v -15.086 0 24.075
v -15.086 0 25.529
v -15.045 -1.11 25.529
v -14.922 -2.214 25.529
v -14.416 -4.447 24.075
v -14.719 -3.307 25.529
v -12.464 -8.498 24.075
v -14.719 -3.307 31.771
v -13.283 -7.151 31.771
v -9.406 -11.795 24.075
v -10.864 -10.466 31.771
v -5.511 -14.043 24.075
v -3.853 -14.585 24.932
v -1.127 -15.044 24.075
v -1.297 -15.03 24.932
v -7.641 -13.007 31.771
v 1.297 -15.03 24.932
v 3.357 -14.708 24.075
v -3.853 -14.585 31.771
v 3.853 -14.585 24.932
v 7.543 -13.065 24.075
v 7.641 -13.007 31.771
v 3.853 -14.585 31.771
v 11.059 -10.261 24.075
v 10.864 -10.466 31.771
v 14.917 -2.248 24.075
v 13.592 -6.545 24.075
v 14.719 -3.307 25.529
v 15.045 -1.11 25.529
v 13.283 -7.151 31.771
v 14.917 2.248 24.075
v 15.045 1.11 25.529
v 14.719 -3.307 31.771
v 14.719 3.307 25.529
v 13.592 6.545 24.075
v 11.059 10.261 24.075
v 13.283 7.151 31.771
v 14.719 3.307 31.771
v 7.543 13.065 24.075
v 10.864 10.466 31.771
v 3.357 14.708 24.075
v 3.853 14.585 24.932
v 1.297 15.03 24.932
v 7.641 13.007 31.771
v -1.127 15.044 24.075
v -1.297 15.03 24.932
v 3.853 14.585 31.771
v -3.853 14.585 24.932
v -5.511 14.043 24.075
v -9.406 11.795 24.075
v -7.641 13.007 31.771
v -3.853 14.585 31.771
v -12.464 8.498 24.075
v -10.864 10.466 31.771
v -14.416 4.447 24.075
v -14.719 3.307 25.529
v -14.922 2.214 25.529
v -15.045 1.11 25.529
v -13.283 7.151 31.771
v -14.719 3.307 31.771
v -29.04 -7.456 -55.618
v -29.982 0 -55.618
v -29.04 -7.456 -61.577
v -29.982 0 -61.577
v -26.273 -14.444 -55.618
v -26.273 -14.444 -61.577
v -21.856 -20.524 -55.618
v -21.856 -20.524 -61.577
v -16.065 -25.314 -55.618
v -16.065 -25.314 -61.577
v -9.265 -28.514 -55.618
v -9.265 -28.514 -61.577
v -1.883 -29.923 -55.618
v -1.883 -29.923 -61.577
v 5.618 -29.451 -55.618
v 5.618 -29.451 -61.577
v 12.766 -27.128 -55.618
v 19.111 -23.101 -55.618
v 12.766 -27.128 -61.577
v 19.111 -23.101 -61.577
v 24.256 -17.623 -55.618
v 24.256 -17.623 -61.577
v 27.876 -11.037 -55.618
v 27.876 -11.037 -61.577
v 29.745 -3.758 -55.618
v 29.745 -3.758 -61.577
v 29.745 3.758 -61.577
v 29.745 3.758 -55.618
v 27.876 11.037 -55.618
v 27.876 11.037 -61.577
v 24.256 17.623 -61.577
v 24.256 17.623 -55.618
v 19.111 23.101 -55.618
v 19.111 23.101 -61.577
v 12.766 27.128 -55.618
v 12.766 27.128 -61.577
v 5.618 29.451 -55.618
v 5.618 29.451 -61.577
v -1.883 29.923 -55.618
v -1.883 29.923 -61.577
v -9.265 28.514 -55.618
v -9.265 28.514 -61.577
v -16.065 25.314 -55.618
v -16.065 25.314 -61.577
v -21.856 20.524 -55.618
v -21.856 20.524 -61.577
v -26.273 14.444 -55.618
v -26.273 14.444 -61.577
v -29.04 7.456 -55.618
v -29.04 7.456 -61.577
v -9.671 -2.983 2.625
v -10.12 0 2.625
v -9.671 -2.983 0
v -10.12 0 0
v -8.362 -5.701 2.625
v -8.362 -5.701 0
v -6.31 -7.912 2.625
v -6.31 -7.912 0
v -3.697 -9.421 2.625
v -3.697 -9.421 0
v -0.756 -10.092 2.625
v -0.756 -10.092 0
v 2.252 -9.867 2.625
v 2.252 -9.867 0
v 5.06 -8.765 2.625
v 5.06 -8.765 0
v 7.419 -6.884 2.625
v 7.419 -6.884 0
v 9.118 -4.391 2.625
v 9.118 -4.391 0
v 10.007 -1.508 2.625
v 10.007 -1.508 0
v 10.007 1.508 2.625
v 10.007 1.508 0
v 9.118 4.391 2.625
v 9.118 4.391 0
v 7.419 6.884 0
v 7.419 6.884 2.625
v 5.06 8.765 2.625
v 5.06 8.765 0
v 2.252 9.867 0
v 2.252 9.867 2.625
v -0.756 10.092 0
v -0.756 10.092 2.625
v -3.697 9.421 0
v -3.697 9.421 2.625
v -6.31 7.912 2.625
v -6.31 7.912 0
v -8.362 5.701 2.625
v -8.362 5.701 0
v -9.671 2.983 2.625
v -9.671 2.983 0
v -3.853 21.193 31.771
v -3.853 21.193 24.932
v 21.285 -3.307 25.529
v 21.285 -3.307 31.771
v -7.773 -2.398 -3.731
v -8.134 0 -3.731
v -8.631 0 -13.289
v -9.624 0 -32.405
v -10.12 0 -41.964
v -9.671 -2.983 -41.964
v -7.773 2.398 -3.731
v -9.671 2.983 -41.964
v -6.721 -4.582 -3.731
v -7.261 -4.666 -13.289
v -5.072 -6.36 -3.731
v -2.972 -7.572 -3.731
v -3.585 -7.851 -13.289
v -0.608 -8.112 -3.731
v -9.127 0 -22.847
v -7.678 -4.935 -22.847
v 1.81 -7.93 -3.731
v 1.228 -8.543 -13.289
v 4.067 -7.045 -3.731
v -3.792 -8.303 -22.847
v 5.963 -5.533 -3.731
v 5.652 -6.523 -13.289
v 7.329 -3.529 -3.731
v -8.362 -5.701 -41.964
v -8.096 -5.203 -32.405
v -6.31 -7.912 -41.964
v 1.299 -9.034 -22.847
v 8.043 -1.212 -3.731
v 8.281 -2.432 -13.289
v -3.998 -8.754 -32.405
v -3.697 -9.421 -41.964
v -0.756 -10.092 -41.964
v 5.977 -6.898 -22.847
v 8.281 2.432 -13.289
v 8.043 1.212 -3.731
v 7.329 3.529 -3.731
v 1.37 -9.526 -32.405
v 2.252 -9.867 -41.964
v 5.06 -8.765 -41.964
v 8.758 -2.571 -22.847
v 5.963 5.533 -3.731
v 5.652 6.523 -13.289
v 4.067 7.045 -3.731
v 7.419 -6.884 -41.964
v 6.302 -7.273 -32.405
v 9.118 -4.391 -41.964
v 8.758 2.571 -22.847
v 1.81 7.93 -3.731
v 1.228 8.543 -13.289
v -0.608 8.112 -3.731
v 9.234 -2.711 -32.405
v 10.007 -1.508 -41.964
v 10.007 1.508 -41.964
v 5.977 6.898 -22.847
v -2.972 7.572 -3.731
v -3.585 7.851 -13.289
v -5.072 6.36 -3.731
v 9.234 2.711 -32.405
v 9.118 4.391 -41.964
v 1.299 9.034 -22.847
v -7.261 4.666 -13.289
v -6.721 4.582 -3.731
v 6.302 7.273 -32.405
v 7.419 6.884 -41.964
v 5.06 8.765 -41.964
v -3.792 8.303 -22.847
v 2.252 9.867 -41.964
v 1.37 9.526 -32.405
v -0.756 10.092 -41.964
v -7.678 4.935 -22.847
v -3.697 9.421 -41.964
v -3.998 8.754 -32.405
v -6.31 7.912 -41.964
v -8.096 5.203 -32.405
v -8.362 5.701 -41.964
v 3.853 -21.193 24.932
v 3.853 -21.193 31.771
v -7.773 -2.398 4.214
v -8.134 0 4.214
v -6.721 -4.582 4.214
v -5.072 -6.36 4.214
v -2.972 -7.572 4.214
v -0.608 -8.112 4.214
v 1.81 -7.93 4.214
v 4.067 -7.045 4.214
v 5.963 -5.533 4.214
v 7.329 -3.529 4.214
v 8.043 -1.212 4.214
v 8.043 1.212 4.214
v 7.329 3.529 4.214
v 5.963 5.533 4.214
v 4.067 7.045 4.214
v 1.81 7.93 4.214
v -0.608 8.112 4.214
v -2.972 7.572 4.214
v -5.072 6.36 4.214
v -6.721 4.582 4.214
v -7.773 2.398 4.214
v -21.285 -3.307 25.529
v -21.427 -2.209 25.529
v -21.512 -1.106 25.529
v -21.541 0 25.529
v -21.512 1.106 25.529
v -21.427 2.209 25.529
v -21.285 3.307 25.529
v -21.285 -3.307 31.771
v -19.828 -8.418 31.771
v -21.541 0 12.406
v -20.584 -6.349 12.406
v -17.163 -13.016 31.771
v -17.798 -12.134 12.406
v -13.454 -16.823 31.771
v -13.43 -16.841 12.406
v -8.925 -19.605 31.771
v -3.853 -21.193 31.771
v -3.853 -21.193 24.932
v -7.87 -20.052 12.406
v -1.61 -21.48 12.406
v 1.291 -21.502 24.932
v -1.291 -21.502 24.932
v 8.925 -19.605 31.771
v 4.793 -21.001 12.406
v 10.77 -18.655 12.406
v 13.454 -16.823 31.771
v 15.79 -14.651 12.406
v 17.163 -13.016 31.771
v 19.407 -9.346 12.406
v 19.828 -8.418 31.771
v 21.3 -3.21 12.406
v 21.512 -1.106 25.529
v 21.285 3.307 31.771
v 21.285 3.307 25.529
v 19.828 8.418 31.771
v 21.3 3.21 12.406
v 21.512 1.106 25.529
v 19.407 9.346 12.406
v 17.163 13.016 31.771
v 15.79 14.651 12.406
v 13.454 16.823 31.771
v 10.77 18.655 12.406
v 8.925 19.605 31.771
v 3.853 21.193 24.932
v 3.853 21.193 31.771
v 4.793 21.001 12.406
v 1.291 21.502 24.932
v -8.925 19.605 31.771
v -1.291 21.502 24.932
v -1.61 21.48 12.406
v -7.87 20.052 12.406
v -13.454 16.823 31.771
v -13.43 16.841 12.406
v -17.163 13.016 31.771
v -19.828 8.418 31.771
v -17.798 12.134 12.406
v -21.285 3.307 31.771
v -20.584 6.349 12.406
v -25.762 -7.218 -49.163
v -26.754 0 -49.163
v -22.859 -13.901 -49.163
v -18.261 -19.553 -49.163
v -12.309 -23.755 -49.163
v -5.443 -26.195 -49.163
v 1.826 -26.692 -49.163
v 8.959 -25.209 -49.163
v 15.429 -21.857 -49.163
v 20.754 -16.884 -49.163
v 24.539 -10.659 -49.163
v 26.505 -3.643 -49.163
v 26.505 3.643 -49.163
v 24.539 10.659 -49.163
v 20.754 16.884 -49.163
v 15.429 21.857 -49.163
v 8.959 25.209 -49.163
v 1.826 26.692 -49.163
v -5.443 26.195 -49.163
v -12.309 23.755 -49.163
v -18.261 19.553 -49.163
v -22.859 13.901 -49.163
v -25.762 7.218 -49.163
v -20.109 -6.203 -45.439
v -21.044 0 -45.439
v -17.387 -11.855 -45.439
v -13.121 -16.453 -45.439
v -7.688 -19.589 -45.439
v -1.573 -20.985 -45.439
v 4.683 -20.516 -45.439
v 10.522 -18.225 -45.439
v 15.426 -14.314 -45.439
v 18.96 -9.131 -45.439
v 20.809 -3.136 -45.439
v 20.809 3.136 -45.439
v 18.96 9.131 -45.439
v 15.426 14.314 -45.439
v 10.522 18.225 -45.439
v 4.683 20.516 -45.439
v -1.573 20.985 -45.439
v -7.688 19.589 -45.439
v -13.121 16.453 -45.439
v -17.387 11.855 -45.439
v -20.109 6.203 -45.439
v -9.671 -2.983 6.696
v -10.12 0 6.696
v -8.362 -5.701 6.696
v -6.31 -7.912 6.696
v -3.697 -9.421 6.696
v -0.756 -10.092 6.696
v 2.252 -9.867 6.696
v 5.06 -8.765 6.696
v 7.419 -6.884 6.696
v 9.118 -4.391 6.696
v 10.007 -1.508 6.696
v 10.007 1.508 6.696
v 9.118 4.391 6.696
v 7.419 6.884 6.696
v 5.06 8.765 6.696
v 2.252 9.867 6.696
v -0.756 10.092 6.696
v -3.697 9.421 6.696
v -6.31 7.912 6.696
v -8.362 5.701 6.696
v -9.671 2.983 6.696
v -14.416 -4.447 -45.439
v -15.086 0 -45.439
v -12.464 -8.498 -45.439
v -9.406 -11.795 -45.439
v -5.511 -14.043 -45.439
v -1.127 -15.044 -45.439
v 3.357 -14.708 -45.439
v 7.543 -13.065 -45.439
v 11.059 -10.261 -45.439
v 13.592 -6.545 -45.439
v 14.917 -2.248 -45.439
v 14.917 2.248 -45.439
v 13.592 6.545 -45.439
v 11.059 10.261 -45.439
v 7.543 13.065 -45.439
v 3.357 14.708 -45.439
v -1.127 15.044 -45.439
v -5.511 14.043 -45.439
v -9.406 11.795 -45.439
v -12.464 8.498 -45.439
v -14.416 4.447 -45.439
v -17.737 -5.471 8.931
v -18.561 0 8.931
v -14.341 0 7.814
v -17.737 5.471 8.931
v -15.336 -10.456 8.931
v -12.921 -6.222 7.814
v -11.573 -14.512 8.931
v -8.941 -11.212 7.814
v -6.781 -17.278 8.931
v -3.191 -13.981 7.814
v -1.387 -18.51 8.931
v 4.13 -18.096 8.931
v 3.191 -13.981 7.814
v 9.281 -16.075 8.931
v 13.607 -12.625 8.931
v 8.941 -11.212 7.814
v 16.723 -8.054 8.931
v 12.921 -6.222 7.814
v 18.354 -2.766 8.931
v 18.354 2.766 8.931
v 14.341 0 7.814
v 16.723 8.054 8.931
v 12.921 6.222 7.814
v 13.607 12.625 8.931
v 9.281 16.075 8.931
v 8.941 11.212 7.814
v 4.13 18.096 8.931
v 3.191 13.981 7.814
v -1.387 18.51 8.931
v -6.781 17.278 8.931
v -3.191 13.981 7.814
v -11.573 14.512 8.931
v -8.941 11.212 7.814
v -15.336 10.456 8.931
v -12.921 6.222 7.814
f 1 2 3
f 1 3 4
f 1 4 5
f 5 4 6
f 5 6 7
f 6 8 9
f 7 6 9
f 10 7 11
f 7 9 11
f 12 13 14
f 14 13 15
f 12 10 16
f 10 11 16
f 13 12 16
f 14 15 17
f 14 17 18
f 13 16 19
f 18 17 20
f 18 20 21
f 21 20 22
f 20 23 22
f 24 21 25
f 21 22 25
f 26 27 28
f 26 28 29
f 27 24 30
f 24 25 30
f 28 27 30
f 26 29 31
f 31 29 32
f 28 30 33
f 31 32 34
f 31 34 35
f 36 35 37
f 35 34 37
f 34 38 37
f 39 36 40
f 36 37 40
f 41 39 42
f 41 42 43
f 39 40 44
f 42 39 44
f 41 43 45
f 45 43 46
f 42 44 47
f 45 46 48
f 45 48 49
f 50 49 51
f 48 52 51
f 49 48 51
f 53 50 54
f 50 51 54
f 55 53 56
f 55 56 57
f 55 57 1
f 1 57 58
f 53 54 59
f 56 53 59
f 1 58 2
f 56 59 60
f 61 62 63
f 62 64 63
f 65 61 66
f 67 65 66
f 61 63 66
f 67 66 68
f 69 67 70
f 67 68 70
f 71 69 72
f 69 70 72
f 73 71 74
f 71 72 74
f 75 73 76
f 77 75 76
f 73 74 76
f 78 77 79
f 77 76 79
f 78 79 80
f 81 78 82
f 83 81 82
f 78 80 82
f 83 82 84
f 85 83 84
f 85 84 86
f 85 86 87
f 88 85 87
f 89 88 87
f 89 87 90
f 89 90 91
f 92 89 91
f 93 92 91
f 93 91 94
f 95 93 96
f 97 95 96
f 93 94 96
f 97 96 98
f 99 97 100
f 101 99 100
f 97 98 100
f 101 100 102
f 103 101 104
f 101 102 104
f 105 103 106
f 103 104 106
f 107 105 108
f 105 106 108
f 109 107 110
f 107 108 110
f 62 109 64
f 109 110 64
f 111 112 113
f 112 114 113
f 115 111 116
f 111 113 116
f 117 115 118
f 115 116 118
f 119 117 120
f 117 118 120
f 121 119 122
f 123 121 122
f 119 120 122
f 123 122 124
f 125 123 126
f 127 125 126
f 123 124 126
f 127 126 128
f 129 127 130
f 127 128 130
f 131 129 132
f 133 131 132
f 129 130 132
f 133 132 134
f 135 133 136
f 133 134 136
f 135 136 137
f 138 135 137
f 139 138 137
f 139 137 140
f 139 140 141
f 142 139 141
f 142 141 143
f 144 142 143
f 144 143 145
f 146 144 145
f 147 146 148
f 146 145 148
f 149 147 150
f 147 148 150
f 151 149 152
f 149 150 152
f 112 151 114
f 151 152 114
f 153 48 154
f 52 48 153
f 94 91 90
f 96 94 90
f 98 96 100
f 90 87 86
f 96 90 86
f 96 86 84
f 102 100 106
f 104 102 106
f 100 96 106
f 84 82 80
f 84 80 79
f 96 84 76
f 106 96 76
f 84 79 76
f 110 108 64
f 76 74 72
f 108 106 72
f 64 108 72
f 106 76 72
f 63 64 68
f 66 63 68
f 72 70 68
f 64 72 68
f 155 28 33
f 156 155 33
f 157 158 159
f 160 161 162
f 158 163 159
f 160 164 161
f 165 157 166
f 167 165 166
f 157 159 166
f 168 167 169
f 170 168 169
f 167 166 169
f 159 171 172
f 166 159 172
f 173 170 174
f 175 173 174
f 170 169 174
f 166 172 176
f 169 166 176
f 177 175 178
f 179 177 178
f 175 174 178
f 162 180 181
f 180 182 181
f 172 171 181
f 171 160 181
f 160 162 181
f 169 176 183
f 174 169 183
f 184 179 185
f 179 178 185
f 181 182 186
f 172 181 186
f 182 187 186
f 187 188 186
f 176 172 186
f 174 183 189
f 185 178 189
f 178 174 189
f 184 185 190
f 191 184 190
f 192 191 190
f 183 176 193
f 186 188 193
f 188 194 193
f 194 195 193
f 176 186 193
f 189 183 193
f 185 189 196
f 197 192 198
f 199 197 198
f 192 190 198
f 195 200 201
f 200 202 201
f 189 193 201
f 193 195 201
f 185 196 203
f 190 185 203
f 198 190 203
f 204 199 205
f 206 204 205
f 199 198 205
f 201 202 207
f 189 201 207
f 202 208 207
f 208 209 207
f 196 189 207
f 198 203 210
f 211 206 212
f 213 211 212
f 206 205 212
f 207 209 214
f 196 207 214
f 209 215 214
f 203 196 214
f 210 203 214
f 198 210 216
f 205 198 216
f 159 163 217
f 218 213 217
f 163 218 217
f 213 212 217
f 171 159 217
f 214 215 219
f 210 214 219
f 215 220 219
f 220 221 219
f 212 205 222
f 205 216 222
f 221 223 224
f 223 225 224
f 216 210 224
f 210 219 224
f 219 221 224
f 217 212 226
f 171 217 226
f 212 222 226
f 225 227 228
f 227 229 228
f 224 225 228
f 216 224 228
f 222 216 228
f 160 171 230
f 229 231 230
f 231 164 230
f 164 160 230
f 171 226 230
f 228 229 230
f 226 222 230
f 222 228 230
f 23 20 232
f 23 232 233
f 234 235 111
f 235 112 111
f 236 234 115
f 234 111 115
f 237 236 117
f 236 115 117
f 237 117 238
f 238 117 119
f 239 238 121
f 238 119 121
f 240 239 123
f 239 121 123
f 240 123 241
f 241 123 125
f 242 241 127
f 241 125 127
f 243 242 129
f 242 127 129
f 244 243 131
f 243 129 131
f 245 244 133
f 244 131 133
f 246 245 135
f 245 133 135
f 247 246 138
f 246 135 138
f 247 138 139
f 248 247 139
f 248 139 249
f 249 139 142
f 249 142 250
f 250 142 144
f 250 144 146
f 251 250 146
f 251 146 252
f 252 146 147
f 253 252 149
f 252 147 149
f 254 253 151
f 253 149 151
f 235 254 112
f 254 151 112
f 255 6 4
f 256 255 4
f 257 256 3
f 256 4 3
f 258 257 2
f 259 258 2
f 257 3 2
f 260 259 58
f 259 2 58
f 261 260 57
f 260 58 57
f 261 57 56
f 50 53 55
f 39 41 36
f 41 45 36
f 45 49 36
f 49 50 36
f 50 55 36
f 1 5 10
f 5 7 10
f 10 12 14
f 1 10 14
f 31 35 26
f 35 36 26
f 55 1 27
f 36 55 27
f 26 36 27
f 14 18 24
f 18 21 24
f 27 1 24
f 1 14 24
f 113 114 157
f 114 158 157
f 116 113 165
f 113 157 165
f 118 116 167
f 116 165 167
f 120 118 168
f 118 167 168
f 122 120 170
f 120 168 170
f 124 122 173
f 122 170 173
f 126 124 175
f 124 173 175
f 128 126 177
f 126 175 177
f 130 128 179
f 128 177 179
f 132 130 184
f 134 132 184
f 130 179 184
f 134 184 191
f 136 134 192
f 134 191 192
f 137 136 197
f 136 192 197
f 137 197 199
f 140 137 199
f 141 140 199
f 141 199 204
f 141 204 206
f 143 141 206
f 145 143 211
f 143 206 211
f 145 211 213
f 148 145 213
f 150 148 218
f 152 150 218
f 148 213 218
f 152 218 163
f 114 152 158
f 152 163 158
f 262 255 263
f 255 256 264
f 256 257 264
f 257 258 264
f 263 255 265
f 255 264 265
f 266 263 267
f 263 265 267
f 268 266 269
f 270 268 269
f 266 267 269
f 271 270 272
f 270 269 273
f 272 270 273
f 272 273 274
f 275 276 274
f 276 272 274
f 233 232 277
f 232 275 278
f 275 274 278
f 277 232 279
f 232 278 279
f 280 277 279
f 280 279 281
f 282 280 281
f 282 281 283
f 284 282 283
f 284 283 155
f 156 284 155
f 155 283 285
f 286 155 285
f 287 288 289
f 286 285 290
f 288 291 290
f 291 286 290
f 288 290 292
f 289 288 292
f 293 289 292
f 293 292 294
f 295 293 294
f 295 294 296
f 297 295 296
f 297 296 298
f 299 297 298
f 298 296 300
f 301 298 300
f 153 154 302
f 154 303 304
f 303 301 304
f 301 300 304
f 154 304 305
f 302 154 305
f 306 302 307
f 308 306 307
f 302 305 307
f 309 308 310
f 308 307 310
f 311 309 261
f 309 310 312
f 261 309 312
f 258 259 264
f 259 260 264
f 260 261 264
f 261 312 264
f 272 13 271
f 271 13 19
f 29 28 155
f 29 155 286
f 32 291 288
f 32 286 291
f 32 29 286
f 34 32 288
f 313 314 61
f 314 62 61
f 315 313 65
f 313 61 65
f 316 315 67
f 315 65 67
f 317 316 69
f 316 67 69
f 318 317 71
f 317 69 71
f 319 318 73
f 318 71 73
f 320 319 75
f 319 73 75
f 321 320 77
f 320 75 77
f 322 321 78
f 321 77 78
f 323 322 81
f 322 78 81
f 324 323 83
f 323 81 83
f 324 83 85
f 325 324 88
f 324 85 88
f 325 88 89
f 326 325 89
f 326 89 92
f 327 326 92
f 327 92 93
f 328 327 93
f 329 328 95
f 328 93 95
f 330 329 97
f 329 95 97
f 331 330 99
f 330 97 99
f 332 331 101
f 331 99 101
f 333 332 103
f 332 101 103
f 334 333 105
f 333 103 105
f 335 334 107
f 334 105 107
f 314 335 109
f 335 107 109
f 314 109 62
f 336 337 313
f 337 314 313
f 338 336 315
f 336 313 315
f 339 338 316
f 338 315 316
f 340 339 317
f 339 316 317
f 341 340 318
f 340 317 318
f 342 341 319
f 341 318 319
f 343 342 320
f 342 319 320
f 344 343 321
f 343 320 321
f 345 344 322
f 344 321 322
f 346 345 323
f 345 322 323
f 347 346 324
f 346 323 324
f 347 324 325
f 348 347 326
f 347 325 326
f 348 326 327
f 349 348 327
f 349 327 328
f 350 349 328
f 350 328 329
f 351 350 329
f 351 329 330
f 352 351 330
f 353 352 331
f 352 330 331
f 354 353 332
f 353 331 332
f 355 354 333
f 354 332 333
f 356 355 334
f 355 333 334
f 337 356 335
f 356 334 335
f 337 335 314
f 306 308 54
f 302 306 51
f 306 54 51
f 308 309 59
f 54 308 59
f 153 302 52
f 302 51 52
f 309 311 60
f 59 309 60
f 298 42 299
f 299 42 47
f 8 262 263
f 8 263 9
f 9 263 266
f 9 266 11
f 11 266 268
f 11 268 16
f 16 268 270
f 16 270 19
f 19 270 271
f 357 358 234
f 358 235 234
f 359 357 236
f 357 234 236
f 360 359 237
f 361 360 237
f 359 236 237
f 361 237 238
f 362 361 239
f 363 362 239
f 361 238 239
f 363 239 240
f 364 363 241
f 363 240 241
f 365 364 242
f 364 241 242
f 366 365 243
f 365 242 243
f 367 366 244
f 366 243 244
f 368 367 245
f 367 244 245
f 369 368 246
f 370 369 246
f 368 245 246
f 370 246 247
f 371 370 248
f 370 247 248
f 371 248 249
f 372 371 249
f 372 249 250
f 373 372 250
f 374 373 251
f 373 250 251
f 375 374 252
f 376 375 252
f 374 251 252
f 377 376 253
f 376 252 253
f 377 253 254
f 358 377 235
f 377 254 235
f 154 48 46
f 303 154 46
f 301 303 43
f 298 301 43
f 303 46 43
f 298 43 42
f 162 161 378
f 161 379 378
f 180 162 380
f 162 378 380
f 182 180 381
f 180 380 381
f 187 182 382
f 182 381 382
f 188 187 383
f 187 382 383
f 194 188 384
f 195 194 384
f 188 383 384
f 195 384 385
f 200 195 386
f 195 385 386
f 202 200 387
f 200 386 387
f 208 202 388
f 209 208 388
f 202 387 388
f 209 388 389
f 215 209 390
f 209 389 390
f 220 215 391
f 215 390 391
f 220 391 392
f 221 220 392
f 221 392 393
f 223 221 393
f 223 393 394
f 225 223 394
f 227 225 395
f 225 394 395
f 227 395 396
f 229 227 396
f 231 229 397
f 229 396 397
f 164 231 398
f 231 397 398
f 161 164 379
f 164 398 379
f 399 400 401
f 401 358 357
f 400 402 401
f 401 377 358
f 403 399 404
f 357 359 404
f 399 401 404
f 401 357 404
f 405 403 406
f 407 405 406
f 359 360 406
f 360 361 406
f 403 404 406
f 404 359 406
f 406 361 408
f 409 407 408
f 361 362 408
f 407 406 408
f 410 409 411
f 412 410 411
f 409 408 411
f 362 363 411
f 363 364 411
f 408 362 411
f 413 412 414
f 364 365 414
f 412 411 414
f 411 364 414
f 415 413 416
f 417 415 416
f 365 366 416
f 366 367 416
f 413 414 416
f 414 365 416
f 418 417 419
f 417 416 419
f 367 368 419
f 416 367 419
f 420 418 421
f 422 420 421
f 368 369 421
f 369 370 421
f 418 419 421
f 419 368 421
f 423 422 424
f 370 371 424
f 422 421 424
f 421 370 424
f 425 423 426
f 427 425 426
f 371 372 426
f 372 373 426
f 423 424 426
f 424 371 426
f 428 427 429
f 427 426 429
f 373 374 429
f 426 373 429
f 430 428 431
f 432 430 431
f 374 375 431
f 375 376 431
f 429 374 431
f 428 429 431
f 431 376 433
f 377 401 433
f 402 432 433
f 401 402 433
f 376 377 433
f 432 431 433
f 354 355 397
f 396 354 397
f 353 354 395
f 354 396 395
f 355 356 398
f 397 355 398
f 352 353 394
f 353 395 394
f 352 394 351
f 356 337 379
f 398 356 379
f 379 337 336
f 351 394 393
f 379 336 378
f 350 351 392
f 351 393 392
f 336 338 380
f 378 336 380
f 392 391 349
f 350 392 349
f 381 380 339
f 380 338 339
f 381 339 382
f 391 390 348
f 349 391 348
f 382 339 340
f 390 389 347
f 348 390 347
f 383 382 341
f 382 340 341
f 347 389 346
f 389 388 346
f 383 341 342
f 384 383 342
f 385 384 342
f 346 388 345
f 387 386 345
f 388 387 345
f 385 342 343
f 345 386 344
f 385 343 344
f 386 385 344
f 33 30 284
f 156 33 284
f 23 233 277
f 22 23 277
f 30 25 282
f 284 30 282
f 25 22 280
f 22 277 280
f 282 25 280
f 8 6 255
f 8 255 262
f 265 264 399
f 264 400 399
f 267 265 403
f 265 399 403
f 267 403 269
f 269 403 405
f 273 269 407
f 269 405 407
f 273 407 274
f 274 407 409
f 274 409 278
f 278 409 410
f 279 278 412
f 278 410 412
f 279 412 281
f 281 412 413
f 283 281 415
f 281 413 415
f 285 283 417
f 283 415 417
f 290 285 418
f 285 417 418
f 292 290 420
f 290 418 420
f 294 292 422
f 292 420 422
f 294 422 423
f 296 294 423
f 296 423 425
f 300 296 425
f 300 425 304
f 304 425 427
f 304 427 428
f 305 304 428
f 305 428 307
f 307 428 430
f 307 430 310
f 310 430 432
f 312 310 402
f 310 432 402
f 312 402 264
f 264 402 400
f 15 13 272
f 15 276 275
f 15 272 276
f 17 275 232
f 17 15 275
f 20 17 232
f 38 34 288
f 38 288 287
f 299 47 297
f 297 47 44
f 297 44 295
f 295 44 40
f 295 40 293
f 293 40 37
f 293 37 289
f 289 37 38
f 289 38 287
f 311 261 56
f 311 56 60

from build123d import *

# Parameters (mm, degrees)
F2_W          = 7.7063473873
F2_H          = 14.5060643554
F3_DEPTH      = 29.9826746265
F3_DEPTH_BACK = 25.4
F4_W          = 6.6132526845
F4_H          = 12.692797929
F5_DEPTH      = 29.9826746265
F5_DEPTH_BACK = 25.4


with BuildPart() as f1:
    # F0 (on Front) → F1 (revolve)
    with BuildSketch(Plane.XZ):
        Polygon((0, -61.5766718984), (0, 24.0749828517), (-15.0857353583, 24.0749828517), (-15.0857353583, 31.7712202668), (-21.5406417847, 31.7712202668), (-21.5406417847, 12.4064972624), (-18.5614544898, 8.9307781309), (-10.120421648, 6.6963867284), (-8.1342970952, 4.2137298733), (-10.120421648, 2.6248309761), (-10.120421648, 0), (-8.1342970952, -3.7307715975), (-10.120421648, -41.9636853039), (-15.0857353583, -45.4394035041), (-21.0441108793, -45.4394035041), (-26.7542209476, -49.163389951), (-29.9816746265, -55.6182973087), (-29.9816746265, -61.5766718984), align=None)
    revolve(axis=Axis((0, 0, -18.7508445233), (0, 0, 1)))

    # F2 (on Front) → F3 (cut, two sides)
    with BuildSketch(Plane.XZ) as f3_sk:
        with Locations((0, 32.1853272617)):
            Rectangle(F2_W, F2_H)
    extrude(amount=-F3_DEPTH, mode=Mode.SUBTRACT)
    extrude(f3_sk.sketch, amount=F3_DEPTH_BACK, mode=Mode.SUBTRACT)

    # F4 (on Right) → F5 (cut, two sides)
    with BuildSketch(Plane.YZ) as f5_sk:
        with Locations((0, 31.875140965)):
            Rectangle(F4_W, F4_H)
    extrude(amount=F5_DEPTH, mode=Mode.SUBTRACT)
    extrude(f5_sk.sketch, amount=-F5_DEPTH_BACK, mode=Mode.SUBTRACT)


solid = f1.part
